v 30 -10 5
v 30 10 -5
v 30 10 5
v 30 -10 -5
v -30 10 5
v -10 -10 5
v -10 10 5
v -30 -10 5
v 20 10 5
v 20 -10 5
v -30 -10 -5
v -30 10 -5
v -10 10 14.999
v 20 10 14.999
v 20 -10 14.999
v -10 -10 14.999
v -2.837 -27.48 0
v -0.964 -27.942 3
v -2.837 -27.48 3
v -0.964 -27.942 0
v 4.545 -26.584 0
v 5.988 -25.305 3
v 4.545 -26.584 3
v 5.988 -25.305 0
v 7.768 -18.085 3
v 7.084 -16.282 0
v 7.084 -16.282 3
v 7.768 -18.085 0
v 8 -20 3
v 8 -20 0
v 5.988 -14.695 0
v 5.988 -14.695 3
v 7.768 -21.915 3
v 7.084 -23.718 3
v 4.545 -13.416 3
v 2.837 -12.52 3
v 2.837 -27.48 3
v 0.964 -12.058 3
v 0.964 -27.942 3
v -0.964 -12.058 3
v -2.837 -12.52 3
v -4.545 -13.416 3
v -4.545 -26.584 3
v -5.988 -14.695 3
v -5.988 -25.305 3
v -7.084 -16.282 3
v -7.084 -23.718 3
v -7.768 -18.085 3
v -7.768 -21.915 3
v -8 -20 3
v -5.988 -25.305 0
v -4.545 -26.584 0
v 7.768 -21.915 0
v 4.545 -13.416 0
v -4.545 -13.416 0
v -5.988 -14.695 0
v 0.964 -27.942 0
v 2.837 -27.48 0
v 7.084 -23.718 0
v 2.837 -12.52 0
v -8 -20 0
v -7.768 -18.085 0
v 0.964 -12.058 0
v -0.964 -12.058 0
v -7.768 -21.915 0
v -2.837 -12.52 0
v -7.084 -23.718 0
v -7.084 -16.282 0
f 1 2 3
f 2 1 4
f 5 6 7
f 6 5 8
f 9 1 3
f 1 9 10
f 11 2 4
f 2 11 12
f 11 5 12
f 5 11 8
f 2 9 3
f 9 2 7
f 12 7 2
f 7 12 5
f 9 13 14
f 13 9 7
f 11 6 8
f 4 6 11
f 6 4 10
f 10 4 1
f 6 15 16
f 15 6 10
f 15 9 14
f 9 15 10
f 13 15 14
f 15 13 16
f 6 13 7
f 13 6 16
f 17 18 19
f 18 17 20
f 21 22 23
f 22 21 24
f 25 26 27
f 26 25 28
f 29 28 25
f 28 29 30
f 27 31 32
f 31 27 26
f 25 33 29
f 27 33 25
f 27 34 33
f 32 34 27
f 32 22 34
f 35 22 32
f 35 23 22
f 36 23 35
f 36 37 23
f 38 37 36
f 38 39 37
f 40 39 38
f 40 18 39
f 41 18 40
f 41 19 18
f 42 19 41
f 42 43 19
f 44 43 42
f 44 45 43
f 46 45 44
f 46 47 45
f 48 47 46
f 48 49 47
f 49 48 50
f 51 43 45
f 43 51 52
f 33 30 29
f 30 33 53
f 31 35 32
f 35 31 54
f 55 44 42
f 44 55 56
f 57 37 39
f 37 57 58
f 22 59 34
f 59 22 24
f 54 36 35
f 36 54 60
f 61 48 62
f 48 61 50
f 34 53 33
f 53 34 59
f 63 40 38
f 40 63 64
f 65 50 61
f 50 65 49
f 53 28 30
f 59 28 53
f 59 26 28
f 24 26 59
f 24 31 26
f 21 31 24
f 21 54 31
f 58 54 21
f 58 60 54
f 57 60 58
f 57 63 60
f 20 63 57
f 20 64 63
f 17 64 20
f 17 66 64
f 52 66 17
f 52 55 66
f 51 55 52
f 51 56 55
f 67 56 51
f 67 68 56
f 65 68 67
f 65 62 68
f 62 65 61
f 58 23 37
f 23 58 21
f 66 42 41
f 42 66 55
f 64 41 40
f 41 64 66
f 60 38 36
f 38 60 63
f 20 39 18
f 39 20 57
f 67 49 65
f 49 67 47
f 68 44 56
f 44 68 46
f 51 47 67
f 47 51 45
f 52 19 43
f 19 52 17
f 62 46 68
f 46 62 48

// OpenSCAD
cube([60,20,10],center=true);
translate([5,0,10 - 0.001])
    cube([30,20,10],center=true);
translate([0,-20,0])
    cylinder(h=3,r=8);
